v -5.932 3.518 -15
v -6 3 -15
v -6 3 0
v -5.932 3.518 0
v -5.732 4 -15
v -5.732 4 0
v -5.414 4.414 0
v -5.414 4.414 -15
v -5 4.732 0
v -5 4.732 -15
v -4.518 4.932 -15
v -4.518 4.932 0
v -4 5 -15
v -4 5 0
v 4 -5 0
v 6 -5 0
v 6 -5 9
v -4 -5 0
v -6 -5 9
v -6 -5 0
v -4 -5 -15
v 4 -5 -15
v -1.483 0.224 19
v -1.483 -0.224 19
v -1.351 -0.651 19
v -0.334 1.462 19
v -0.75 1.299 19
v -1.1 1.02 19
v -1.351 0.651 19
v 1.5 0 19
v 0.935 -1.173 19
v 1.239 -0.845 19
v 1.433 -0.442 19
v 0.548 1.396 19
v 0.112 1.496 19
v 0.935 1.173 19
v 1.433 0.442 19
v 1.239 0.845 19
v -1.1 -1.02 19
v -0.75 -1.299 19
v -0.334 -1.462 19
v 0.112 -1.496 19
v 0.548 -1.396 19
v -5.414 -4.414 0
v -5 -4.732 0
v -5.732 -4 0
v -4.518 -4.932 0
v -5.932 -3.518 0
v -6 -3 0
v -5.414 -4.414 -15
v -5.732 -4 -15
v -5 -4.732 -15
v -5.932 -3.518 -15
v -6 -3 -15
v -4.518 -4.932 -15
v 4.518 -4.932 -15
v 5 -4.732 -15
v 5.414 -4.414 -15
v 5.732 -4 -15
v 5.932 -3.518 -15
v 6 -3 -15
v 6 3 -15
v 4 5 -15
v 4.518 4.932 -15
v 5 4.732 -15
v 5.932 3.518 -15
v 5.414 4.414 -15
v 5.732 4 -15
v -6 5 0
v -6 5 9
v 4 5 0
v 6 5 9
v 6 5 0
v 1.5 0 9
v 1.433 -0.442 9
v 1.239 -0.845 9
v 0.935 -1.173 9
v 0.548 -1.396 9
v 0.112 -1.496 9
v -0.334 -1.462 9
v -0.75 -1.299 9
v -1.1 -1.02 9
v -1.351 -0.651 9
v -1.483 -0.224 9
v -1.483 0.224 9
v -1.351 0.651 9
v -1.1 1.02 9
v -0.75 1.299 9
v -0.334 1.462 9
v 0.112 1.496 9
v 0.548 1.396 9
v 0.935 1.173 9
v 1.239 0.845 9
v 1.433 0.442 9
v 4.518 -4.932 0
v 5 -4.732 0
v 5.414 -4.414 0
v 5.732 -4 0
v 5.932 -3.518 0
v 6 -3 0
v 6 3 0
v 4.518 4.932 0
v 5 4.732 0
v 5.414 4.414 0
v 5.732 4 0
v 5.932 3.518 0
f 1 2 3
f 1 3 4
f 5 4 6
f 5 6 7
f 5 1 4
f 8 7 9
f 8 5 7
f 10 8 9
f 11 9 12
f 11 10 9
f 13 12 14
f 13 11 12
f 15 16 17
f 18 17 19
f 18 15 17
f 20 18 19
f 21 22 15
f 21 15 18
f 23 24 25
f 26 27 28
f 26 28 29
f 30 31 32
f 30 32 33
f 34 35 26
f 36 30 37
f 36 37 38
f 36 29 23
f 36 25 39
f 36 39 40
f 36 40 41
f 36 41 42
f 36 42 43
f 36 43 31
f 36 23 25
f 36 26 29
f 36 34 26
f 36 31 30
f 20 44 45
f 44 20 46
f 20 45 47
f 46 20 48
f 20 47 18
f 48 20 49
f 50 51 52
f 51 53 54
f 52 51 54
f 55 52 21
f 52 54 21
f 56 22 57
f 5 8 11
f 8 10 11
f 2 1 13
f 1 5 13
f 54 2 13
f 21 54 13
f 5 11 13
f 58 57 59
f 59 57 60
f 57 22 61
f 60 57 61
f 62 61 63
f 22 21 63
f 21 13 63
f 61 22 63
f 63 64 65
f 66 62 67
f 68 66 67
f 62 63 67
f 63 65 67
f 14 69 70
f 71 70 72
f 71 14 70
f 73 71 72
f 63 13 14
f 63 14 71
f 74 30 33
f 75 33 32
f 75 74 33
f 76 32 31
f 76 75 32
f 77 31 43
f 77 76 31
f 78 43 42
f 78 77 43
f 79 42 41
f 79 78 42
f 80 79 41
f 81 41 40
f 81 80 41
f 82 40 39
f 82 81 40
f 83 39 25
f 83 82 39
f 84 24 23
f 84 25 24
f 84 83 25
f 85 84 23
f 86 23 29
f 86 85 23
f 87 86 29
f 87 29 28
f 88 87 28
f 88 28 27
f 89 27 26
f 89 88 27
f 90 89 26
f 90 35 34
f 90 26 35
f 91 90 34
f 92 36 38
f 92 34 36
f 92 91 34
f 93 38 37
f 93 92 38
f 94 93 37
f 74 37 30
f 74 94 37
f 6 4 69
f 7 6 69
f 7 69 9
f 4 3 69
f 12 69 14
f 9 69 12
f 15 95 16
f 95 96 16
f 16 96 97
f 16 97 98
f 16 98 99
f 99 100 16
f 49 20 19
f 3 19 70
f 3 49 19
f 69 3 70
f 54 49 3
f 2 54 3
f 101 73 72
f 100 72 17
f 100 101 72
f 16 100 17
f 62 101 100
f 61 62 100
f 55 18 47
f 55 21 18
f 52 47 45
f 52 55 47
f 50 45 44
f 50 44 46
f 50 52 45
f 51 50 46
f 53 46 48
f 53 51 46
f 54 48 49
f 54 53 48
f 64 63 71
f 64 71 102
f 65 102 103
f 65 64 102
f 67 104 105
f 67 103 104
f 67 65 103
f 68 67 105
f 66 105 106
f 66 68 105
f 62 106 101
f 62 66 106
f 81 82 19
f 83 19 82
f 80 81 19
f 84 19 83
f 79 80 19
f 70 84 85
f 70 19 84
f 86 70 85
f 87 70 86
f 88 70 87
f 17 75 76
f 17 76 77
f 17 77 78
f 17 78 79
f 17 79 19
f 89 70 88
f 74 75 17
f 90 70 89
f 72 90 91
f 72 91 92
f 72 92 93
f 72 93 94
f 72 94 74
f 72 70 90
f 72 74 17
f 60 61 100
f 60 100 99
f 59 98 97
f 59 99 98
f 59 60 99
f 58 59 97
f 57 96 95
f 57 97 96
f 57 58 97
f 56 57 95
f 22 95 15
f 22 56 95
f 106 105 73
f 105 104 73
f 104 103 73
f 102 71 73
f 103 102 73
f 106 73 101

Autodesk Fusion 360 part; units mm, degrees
sketch "草图1" plane through (0, 0, 0) normal (0, 0, 1) x (1, 0, 0)
  line L0 (6, -5) -> (-6, -5)
  line L1 (-6, -5) -> (-6, 5)
  line L2 (-6, 5) -> (6, 5)
  line L3 (6, 5) -> (6, -5)
  line L4 (6, -5) -> (-6, 5) construction
  line L5 (-6, -5) -> (6, 5) construction
  circle A0 centre (0, 0) radius 1.5
  dimension "d1" = 12
  dimension "d2" = 10
  dimension "d3" = 3
extrude "拉伸1" add sketch "草图1" along normal blind 9 contours L0 L1 L2 L3 | A0 makes body 1
extrude "拉伸2" add sketch "草图1" against normal blind 15 separate body contours L0 L1 L2 L3 | A0 makes body 2
fillet "圆角1" radius 2 4 edges at (6, 5, -7.5) (-6, 5, -7.5) (6, -5, -7.5) (-6, -5, -7.5) on bodies 2
extrude "拉伸3" add sketch "草图1" along normal blind 19 contours A0 bodies 1 2
